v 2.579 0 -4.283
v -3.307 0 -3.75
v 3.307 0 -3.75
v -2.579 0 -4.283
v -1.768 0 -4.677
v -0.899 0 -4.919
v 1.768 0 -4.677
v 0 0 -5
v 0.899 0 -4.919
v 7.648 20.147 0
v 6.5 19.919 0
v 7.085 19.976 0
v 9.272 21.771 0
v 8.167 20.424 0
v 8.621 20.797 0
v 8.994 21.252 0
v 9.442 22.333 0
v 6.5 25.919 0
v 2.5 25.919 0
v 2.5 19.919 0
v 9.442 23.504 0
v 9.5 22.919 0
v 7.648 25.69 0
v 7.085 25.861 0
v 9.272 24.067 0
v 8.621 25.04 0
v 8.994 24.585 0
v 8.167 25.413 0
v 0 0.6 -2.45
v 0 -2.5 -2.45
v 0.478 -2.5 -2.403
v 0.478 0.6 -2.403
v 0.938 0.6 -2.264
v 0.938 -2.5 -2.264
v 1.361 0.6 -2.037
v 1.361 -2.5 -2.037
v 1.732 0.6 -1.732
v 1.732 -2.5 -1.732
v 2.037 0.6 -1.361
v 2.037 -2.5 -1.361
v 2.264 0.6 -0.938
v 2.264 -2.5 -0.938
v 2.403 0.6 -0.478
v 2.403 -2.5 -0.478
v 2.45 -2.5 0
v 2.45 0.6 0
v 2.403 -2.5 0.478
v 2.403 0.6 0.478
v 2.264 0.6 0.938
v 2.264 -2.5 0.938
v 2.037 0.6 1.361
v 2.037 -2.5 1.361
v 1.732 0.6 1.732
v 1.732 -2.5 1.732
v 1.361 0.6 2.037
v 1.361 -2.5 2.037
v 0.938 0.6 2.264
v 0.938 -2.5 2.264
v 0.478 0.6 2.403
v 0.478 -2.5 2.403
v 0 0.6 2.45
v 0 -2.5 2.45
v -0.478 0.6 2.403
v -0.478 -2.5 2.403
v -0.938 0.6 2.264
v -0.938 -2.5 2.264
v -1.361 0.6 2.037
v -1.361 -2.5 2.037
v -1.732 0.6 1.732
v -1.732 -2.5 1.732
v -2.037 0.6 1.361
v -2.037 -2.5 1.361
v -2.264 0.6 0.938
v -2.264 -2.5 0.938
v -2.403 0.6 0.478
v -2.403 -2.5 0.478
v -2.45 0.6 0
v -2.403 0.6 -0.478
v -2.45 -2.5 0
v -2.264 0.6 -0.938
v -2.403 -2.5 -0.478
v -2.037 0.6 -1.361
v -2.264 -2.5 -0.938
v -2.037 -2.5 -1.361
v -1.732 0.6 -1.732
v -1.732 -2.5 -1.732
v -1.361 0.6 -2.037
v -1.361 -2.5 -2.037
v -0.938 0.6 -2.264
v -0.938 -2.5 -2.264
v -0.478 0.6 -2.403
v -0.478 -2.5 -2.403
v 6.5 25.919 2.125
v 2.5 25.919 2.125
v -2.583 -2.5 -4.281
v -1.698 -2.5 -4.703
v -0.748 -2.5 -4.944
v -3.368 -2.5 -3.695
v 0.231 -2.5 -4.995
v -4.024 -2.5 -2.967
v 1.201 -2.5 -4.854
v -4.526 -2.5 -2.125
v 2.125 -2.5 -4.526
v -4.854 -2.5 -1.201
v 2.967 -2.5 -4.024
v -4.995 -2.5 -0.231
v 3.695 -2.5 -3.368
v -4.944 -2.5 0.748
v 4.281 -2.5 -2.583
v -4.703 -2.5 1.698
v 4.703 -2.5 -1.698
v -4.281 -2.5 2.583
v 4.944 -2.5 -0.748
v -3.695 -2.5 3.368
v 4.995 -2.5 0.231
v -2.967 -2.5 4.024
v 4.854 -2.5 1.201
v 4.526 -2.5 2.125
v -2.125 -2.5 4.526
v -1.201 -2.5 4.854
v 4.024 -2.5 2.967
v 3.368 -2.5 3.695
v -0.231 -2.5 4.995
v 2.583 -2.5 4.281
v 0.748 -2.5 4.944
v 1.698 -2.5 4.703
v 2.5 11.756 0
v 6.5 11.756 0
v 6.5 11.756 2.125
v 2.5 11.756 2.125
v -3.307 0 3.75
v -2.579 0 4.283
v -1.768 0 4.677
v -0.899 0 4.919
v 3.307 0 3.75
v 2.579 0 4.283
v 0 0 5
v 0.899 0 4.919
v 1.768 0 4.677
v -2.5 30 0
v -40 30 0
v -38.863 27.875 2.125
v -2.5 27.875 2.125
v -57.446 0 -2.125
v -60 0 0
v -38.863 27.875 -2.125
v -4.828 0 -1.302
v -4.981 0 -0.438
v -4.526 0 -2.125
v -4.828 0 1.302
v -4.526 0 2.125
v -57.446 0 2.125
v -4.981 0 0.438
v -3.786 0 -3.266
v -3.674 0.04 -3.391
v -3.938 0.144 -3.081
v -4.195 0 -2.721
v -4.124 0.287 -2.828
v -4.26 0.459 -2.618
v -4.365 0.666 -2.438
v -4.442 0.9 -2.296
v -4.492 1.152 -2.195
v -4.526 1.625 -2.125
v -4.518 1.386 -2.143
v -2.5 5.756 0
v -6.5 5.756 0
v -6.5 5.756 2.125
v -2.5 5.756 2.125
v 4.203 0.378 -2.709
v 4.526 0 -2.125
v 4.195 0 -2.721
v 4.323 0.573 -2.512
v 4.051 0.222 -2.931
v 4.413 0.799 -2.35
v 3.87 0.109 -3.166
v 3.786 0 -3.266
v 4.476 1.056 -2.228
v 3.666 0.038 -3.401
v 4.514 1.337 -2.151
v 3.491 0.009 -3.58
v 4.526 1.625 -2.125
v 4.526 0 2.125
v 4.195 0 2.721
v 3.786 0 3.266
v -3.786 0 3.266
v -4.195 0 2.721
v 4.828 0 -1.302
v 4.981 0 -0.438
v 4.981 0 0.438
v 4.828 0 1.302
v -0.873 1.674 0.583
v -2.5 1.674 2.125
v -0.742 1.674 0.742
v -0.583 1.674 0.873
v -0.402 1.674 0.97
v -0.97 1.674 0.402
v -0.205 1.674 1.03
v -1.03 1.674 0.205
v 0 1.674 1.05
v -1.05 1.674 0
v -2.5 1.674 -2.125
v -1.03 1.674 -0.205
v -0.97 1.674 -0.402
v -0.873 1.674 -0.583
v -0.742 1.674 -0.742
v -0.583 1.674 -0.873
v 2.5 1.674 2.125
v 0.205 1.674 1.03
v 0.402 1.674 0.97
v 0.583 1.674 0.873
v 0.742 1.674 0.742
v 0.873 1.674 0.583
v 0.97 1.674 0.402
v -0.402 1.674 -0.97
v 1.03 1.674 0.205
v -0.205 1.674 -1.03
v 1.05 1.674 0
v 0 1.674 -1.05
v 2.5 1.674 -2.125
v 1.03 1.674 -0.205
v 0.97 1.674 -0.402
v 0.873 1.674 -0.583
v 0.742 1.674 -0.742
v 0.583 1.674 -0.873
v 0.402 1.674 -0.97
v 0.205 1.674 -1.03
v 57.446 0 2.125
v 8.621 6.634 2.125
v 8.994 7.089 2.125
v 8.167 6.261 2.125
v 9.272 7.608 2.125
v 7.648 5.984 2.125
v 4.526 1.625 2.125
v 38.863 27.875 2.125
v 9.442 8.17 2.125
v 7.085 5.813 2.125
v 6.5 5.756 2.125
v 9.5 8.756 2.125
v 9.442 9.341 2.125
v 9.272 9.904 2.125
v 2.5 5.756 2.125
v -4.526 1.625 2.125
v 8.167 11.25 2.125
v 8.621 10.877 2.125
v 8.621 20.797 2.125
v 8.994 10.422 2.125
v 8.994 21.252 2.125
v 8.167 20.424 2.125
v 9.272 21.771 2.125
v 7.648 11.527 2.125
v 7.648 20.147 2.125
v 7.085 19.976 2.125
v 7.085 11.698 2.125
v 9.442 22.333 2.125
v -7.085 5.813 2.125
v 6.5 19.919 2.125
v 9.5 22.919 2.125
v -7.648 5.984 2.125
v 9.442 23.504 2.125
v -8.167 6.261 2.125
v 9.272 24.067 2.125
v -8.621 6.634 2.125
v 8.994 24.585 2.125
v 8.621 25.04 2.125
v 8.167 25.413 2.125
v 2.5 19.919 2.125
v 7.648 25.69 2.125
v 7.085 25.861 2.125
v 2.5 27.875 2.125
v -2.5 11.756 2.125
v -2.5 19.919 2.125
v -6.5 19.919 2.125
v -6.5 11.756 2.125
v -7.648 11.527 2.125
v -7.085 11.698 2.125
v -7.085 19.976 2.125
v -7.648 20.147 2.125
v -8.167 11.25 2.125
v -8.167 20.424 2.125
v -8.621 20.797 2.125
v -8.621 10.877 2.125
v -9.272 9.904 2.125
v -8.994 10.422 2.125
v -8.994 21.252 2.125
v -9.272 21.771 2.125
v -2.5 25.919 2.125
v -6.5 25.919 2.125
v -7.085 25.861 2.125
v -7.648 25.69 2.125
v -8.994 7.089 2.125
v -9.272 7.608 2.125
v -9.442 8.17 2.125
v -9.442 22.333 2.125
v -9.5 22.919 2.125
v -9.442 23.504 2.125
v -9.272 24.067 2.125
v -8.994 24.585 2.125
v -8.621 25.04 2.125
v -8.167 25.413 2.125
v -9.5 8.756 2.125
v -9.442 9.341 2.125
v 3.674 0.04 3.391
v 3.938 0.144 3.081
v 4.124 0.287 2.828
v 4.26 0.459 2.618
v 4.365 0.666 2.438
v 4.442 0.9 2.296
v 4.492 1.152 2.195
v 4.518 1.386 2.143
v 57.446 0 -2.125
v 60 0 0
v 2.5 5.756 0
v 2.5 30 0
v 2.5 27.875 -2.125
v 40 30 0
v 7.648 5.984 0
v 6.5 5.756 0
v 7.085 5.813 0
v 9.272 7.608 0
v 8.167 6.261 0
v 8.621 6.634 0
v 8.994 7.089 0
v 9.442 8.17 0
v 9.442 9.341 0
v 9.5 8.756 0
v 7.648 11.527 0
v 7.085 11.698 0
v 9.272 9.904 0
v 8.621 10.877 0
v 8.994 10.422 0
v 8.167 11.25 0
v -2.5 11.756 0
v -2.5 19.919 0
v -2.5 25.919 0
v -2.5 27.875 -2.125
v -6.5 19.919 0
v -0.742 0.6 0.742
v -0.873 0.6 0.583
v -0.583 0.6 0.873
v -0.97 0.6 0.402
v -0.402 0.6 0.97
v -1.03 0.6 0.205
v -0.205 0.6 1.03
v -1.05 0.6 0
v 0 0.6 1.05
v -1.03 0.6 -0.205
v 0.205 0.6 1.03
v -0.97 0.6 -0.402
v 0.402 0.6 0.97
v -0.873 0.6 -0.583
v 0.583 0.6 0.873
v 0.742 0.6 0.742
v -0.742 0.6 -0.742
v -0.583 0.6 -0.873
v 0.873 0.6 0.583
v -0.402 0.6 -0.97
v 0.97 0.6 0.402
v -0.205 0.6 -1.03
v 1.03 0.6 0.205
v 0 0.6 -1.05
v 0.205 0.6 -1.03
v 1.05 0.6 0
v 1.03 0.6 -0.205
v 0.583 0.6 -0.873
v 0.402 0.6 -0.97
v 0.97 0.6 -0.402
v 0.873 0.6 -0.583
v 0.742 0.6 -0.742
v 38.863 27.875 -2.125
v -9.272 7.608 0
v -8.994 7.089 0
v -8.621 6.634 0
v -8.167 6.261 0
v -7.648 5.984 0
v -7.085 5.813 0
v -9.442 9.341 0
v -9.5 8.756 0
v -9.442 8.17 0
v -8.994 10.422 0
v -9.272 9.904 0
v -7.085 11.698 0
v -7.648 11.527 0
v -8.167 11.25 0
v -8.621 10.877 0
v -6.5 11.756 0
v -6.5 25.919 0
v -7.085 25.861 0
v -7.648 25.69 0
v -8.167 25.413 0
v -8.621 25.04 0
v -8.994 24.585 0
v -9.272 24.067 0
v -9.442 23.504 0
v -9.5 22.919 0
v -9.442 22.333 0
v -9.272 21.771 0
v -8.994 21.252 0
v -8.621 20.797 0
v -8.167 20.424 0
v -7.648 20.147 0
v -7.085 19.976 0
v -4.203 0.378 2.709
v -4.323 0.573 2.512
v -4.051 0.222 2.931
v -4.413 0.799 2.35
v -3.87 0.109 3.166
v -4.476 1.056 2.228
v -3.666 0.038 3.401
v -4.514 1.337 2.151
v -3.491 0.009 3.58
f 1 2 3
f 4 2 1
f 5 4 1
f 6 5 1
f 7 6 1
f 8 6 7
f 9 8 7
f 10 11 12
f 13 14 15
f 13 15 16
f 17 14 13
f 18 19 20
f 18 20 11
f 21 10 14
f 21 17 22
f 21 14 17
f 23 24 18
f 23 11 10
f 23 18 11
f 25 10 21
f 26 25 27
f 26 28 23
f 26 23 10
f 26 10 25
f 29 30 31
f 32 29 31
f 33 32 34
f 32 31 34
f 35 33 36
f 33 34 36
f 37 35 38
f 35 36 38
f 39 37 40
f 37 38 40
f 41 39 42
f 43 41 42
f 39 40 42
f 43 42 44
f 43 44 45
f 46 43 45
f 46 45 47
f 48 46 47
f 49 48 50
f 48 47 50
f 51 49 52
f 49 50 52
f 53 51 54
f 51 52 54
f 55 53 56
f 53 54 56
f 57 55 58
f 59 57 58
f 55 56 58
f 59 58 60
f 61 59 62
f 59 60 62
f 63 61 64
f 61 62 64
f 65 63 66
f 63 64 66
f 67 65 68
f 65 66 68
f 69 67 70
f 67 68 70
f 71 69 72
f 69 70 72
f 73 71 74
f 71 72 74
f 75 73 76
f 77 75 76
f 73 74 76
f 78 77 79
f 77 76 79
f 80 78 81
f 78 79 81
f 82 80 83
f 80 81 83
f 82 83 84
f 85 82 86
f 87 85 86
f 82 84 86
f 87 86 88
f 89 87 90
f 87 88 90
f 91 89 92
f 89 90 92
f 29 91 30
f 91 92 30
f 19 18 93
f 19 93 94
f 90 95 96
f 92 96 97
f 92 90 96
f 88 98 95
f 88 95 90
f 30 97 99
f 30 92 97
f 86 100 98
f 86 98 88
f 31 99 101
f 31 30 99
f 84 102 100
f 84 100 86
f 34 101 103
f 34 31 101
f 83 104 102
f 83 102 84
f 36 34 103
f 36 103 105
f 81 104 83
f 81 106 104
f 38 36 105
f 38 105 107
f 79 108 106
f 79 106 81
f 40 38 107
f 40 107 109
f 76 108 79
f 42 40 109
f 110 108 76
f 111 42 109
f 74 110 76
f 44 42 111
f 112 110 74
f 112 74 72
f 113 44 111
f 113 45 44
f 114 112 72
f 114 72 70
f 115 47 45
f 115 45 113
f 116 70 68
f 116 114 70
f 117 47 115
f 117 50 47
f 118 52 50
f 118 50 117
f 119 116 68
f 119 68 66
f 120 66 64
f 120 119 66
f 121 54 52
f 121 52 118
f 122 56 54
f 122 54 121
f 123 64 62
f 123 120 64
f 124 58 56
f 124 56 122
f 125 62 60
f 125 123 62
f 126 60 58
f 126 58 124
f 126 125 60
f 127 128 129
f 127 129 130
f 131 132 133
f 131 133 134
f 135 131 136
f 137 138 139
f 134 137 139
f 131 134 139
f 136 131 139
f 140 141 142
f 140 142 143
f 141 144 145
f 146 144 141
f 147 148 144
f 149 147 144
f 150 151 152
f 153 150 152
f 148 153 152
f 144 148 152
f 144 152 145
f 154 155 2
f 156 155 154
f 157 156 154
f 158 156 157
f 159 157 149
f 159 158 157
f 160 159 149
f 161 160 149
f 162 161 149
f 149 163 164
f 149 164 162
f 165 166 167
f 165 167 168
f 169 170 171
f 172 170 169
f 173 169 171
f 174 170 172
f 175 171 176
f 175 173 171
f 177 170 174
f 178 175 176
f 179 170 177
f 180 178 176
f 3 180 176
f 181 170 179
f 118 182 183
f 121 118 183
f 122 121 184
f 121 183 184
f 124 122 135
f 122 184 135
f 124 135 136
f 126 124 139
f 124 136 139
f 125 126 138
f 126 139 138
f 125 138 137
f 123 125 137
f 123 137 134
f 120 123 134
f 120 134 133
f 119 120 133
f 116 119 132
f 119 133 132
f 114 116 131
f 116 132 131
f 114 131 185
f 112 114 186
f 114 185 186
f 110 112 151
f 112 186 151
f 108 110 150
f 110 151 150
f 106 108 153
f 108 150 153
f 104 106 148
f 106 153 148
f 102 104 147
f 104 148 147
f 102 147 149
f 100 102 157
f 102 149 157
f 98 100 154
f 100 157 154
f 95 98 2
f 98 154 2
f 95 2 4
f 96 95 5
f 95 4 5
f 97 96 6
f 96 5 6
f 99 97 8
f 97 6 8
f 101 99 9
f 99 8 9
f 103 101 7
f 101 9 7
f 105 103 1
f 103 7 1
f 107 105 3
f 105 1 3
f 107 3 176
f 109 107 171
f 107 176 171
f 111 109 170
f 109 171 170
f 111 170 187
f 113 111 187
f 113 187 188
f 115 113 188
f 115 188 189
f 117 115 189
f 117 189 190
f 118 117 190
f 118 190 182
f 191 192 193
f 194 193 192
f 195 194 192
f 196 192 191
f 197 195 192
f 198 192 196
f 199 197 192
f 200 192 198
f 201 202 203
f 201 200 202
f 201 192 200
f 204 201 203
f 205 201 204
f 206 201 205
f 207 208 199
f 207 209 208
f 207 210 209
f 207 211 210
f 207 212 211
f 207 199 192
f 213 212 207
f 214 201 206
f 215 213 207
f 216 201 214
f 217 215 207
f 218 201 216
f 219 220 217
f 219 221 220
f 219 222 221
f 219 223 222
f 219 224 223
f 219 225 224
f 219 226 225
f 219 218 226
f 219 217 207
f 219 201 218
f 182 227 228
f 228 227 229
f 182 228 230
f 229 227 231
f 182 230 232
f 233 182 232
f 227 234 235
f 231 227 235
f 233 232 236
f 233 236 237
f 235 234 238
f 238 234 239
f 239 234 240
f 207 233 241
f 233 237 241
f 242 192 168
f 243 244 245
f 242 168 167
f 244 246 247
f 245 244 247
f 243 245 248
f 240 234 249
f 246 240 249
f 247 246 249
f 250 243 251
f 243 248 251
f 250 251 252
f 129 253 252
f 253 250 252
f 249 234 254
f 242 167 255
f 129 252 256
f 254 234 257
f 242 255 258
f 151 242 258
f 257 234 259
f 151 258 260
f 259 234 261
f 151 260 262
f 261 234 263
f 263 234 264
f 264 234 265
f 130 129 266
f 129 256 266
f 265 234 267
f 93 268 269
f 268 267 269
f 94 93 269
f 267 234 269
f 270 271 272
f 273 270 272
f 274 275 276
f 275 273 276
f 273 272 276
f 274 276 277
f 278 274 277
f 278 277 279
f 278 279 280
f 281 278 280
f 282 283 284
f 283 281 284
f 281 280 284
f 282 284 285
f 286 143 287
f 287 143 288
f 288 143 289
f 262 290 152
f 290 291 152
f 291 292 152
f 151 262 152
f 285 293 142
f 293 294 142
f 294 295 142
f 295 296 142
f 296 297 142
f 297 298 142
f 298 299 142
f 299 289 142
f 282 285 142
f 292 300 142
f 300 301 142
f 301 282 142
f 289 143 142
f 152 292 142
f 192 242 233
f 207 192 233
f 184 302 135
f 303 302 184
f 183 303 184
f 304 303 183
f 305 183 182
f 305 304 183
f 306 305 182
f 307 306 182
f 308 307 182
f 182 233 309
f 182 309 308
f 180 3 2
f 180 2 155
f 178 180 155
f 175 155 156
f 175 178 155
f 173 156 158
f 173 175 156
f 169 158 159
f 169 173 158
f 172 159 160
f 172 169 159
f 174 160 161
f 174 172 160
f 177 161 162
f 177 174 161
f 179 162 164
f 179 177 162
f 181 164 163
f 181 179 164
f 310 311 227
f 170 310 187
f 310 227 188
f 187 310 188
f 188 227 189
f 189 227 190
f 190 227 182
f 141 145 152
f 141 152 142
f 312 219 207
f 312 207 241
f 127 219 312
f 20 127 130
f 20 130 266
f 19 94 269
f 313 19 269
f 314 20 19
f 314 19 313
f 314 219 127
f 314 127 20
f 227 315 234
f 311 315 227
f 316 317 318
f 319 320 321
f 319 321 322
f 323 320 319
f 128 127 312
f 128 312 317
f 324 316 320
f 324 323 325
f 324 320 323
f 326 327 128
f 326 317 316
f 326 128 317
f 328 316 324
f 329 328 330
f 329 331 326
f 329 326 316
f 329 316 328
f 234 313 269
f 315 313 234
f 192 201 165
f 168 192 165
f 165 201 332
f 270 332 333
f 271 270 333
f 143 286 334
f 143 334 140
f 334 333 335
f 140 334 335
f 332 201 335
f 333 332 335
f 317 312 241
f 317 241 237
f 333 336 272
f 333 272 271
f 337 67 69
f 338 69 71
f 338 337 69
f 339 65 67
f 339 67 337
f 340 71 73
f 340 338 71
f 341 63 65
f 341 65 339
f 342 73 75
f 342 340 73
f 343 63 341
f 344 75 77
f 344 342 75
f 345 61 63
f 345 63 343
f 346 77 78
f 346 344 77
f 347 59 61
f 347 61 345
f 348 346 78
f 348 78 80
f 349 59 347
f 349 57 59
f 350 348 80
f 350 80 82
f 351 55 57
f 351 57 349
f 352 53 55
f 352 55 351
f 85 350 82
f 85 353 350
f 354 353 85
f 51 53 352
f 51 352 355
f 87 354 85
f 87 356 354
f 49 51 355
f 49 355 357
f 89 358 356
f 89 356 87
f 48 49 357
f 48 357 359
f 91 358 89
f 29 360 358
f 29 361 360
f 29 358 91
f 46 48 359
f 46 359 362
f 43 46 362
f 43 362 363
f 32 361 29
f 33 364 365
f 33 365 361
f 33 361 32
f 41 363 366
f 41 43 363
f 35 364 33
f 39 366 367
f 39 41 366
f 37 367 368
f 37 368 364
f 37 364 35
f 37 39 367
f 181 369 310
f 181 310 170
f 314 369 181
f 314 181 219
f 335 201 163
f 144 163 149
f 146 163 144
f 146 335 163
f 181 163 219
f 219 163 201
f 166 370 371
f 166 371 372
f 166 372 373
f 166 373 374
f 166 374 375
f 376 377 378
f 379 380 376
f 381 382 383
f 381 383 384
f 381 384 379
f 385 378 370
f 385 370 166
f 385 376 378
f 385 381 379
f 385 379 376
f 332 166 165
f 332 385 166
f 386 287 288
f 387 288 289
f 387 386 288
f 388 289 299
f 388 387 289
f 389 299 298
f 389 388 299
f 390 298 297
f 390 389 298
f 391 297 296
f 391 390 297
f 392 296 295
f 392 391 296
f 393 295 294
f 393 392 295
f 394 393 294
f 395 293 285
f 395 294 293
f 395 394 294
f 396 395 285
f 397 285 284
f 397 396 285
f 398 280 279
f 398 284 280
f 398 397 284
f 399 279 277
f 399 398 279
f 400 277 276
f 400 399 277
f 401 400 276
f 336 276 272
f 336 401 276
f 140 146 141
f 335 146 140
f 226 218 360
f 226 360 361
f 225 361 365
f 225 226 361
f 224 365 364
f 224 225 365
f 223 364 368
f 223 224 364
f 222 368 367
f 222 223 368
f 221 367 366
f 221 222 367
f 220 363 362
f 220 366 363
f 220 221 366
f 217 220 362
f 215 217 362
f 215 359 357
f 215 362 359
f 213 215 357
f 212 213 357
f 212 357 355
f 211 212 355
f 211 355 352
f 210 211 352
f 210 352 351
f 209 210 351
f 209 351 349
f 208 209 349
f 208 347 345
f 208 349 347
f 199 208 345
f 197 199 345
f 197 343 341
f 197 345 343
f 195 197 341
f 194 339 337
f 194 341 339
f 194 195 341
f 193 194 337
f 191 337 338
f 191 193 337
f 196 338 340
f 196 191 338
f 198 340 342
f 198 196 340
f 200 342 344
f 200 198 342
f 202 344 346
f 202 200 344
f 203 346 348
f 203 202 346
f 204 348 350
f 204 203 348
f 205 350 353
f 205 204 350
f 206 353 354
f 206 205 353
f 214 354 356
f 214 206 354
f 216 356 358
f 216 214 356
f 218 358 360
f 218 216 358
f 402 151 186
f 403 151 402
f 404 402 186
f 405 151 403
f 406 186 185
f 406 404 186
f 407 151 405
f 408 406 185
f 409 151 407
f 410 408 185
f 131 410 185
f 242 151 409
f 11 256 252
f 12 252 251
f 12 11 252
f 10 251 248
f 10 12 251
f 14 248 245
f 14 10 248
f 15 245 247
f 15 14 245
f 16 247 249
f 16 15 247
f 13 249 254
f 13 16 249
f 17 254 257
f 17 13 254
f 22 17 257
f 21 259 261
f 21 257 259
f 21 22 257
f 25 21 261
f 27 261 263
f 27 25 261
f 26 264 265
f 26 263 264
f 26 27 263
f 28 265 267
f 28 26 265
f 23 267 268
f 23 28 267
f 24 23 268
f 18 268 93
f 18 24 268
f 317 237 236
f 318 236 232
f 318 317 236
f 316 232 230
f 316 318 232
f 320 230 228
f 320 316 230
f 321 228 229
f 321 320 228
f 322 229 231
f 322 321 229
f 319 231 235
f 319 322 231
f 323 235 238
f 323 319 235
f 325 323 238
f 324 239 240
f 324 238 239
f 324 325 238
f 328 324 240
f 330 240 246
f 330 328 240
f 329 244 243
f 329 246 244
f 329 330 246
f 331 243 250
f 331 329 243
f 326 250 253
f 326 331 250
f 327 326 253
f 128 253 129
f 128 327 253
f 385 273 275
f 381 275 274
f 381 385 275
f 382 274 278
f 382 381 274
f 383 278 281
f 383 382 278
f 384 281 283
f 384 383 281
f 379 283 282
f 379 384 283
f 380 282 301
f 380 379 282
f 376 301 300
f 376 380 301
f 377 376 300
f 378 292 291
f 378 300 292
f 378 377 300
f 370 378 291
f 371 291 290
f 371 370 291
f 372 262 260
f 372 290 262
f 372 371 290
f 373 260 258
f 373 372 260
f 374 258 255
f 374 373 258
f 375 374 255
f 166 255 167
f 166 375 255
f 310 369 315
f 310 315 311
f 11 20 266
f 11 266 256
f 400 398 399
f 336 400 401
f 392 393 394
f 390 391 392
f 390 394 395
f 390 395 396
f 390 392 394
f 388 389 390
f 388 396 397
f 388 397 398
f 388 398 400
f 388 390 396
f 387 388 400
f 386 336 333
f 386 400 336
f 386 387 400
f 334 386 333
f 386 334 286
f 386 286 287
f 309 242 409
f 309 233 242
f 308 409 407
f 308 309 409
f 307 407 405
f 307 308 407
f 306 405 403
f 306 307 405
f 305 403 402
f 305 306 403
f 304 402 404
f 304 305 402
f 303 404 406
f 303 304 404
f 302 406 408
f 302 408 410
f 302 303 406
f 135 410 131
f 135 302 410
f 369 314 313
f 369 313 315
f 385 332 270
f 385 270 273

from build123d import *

# Parameters (mm, degrees)
SALIENTE_EXTRUIR1_DEPTH = 2.125
CROQUIS2_R              = 5
SALIENTE_EXTRUIR2_DEPTH = 2.5
REDONDEO1_R             = 1.625
SKETCH1_R               = 2.45
CUT_EXTRUDE1_DEPTH      = 3.1
CHAMFER1_SIZE           = 2.125
CUT_EXTRUDE2_DEPTH      = 68.459362768
CUT_EXTRUDE2_DEPTH_BACK = 68.459362768
SKETCH2_W               = 5
SKETCH2_H               = 28.351341624
CUT_EXTRUDE3_DEPTH      = 68.002686513
CUT_EXTRUDE3_DEPTH_BACK = 68.002686513
SKETCH3_R               = 1.05
CUT_EXTRUDE4_DEPTH      = 68.459362768
CUT_EXTRUDE4_DEPTH_BACK = 2.125


# Some blends are built 0.0001 mm under size
with BuildPart() as part:
    # Croquis1 → Saliente-Extruir1 (new, symmetric)
    with BuildSketch(Plane.XY):
        Polygon((60, 0), (-60, 0), (-40, 30), (40, 30), align=None)
    extrude(amount=SALIENTE_EXTRUIR1_DEPTH, both=True)

    # Croquis2 → Saliente-Extruir2 (add)
    with BuildSketch(Plane.XZ):
        with Locations(Location((0, 0, 0), (0, 0, 25.150663413))):
            Circle(CROQUIS2_R)
    extrude(amount=SALIENTE_EXTRUIR2_DEPTH)

    # Redondeo1
    # the kernel refuses this fillet: 1.625 mm, written as the material it adds along each edge
    with BuildSketch(Plane(origin=(8.588466748, 0, -2.125), x_dir=(0, 1, 0), z_dir=(-1, 0, 0))) as redondeo1_piece_1_section:
        with BuildLine():
            CenterArc((REDONDEO1_R, REDONDEO1_R), REDONDEO1_R, 180, 90)
            Line((0, REDONDEO1_R), (0, 0))
            Line((0, 0), (REDONDEO1_R, 0))
        make_face()
    redondeo1_piece_1 = extrude(amount=17.176933495, mode=Mode.PRIVATE)
    redondeo1_piece_1 = redondeo1_piece_1 & Plane(origin=(0, 0.370660795, 0), x_dir=(0.9051933495081991, 0, 0.4250000000072087), z_dir=(0, 1, 0)) * Cylinder(5, 41, mode=Mode.PRIVATE)
    add(redondeo1_piece_1)
    with BuildSketch(Plane(origin=(8.588466748, 0, 2.125), x_dir=(0, 1, 0), z_dir=(-1, 0, 0))) as redondeo1_piece_2_section:
        with BuildLine():
            CenterArc((REDONDEO1_R, -REDONDEO1_R), REDONDEO1_R, 90, 90)
            Line((0, -REDONDEO1_R), (0, 0))
            Line((0, 0), (REDONDEO1_R, 0))
        make_face()
    redondeo1_piece_2 = extrude(amount=17.176933495, mode=Mode.PRIVATE)
    redondeo1_piece_2 = redondeo1_piece_2 & Plane(origin=(0, 0.370660827, 0), x_dir=(0.9051933495081991, 0, 0.4250000000072087), z_dir=(0, 1, 0)) * Cylinder(5, 41, mode=Mode.PRIVATE)
    add(redondeo1_piece_2)

    # Sketch1 → Cut-Extrude1 (cut)
    with BuildSketch(Plane.XZ.offset(2.5)):
        with Locations(Location((0, 0, 0), (0, 0, 270))):
            Circle(SKETCH1_R)
    extrude(amount=-CUT_EXTRUDE1_DEPTH, mode=Mode.SUBTRACT)

    # Chamfer1
    chamfer1_edges = [part.edges().sort_by_distance(p)[0] for p in [
        (50, 15, -2.125),
        (0, 30, -2.125),
        (-50, 15, -2.125),
        (50, 15, 2.125),
        (0, 30, 2.125),
        (-50, 15, 2.125),
    ]]
    chamfer(chamfer1_edges, length=CHAMFER1_SIZE - 0.0001)  # a hair under: the kernel refuses the full size

    # Sketch2 → Cut-Extrude2 (cut, two sides: drawn at the far end of the back side and taken through both)
    with BuildSketch(Plane.XY.offset(2.125).offset(-CUT_EXTRUDE2_DEPTH_BACK)):
        with Locations((0, 15.85)):
            Rectangle(SKETCH2_W, SKETCH2_H)
    extrude(amount=CUT_EXTRUDE2_DEPTH + CUT_EXTRUDE2_DEPTH_BACK, mode=Mode.SUBTRACT)

    # Sketch3 → Cut-Extrude3 (cut, two sides: drawn at the far end of the back side and taken through both)
    with BuildSketch(Plane.XZ.offset(-0.6).offset(-CUT_EXTRUDE3_DEPTH_BACK)):
        with Locations(Location((0, 0, 0), (0, 0, 270))):
            Circle(SKETCH3_R)
    extrude(amount=CUT_EXTRUDE3_DEPTH + CUT_EXTRUDE3_DEPTH_BACK, mode=Mode.SUBTRACT)

    # Sketch4 → Cut-Extrude4 (cut, two sides: drawn at the far end of the back side and taken through both)
    with BuildSketch(Plane.XY.offset(2.125).offset(-CUT_EXTRUDE4_DEPTH_BACK)):
        with BuildLine():
            Line((2.5, 25.918582297), (2.5, 19.918582297))
            Line((2.5, 19.918582297), (6.5, 19.918582297))
            ThreePointArc((6.5, 19.918582297), (9.5, 22.918582297), (6.5, 25.918582297))
            Line((6.5, 25.918582297), (2.5, 25.918582297))
        make_face()
        with BuildLine():
            Line((6.5, 11.755746891), (2.5, 11.755746891))
            Line((2.5, 11.755746891), (2.5, 5.755746891))
            Line((2.5, 5.755746891), (6.5, 5.755746891))
            ThreePointArc((6.5, 5.755746891), (9.5, 8.755746891), (6.5, 11.755746891))
        make_face()
        with BuildLine():
            Line((-6.5, 19.918582297), (-2.5, 19.918582297))
            Line((-2.5, 19.918582297), (-2.5, 25.918582297))
            Line((-2.5, 25.918582297), (-6.5, 25.918582297))
            ThreePointArc((-6.5, 25.918582297), (-9.5, 22.918582297), (-6.5, 19.918582297))
        make_face()
        with BuildLine():
            Line((-2.5, 5.755746891), (-2.5, 11.755746891))
            Line((-2.5, 11.755746891), (-6.5, 11.755746891))
            ThreePointArc((-6.5, 11.755746891), (-9.5, 8.755746891), (-6.5, 5.755746891))
            Line((-6.5, 5.755746891), (-2.5, 5.755746891))
        make_face()
    extrude(amount=CUT_EXTRUDE4_DEPTH + CUT_EXTRUDE4_DEPTH_BACK, mode=Mode.SUBTRACT)


solid = part.part
